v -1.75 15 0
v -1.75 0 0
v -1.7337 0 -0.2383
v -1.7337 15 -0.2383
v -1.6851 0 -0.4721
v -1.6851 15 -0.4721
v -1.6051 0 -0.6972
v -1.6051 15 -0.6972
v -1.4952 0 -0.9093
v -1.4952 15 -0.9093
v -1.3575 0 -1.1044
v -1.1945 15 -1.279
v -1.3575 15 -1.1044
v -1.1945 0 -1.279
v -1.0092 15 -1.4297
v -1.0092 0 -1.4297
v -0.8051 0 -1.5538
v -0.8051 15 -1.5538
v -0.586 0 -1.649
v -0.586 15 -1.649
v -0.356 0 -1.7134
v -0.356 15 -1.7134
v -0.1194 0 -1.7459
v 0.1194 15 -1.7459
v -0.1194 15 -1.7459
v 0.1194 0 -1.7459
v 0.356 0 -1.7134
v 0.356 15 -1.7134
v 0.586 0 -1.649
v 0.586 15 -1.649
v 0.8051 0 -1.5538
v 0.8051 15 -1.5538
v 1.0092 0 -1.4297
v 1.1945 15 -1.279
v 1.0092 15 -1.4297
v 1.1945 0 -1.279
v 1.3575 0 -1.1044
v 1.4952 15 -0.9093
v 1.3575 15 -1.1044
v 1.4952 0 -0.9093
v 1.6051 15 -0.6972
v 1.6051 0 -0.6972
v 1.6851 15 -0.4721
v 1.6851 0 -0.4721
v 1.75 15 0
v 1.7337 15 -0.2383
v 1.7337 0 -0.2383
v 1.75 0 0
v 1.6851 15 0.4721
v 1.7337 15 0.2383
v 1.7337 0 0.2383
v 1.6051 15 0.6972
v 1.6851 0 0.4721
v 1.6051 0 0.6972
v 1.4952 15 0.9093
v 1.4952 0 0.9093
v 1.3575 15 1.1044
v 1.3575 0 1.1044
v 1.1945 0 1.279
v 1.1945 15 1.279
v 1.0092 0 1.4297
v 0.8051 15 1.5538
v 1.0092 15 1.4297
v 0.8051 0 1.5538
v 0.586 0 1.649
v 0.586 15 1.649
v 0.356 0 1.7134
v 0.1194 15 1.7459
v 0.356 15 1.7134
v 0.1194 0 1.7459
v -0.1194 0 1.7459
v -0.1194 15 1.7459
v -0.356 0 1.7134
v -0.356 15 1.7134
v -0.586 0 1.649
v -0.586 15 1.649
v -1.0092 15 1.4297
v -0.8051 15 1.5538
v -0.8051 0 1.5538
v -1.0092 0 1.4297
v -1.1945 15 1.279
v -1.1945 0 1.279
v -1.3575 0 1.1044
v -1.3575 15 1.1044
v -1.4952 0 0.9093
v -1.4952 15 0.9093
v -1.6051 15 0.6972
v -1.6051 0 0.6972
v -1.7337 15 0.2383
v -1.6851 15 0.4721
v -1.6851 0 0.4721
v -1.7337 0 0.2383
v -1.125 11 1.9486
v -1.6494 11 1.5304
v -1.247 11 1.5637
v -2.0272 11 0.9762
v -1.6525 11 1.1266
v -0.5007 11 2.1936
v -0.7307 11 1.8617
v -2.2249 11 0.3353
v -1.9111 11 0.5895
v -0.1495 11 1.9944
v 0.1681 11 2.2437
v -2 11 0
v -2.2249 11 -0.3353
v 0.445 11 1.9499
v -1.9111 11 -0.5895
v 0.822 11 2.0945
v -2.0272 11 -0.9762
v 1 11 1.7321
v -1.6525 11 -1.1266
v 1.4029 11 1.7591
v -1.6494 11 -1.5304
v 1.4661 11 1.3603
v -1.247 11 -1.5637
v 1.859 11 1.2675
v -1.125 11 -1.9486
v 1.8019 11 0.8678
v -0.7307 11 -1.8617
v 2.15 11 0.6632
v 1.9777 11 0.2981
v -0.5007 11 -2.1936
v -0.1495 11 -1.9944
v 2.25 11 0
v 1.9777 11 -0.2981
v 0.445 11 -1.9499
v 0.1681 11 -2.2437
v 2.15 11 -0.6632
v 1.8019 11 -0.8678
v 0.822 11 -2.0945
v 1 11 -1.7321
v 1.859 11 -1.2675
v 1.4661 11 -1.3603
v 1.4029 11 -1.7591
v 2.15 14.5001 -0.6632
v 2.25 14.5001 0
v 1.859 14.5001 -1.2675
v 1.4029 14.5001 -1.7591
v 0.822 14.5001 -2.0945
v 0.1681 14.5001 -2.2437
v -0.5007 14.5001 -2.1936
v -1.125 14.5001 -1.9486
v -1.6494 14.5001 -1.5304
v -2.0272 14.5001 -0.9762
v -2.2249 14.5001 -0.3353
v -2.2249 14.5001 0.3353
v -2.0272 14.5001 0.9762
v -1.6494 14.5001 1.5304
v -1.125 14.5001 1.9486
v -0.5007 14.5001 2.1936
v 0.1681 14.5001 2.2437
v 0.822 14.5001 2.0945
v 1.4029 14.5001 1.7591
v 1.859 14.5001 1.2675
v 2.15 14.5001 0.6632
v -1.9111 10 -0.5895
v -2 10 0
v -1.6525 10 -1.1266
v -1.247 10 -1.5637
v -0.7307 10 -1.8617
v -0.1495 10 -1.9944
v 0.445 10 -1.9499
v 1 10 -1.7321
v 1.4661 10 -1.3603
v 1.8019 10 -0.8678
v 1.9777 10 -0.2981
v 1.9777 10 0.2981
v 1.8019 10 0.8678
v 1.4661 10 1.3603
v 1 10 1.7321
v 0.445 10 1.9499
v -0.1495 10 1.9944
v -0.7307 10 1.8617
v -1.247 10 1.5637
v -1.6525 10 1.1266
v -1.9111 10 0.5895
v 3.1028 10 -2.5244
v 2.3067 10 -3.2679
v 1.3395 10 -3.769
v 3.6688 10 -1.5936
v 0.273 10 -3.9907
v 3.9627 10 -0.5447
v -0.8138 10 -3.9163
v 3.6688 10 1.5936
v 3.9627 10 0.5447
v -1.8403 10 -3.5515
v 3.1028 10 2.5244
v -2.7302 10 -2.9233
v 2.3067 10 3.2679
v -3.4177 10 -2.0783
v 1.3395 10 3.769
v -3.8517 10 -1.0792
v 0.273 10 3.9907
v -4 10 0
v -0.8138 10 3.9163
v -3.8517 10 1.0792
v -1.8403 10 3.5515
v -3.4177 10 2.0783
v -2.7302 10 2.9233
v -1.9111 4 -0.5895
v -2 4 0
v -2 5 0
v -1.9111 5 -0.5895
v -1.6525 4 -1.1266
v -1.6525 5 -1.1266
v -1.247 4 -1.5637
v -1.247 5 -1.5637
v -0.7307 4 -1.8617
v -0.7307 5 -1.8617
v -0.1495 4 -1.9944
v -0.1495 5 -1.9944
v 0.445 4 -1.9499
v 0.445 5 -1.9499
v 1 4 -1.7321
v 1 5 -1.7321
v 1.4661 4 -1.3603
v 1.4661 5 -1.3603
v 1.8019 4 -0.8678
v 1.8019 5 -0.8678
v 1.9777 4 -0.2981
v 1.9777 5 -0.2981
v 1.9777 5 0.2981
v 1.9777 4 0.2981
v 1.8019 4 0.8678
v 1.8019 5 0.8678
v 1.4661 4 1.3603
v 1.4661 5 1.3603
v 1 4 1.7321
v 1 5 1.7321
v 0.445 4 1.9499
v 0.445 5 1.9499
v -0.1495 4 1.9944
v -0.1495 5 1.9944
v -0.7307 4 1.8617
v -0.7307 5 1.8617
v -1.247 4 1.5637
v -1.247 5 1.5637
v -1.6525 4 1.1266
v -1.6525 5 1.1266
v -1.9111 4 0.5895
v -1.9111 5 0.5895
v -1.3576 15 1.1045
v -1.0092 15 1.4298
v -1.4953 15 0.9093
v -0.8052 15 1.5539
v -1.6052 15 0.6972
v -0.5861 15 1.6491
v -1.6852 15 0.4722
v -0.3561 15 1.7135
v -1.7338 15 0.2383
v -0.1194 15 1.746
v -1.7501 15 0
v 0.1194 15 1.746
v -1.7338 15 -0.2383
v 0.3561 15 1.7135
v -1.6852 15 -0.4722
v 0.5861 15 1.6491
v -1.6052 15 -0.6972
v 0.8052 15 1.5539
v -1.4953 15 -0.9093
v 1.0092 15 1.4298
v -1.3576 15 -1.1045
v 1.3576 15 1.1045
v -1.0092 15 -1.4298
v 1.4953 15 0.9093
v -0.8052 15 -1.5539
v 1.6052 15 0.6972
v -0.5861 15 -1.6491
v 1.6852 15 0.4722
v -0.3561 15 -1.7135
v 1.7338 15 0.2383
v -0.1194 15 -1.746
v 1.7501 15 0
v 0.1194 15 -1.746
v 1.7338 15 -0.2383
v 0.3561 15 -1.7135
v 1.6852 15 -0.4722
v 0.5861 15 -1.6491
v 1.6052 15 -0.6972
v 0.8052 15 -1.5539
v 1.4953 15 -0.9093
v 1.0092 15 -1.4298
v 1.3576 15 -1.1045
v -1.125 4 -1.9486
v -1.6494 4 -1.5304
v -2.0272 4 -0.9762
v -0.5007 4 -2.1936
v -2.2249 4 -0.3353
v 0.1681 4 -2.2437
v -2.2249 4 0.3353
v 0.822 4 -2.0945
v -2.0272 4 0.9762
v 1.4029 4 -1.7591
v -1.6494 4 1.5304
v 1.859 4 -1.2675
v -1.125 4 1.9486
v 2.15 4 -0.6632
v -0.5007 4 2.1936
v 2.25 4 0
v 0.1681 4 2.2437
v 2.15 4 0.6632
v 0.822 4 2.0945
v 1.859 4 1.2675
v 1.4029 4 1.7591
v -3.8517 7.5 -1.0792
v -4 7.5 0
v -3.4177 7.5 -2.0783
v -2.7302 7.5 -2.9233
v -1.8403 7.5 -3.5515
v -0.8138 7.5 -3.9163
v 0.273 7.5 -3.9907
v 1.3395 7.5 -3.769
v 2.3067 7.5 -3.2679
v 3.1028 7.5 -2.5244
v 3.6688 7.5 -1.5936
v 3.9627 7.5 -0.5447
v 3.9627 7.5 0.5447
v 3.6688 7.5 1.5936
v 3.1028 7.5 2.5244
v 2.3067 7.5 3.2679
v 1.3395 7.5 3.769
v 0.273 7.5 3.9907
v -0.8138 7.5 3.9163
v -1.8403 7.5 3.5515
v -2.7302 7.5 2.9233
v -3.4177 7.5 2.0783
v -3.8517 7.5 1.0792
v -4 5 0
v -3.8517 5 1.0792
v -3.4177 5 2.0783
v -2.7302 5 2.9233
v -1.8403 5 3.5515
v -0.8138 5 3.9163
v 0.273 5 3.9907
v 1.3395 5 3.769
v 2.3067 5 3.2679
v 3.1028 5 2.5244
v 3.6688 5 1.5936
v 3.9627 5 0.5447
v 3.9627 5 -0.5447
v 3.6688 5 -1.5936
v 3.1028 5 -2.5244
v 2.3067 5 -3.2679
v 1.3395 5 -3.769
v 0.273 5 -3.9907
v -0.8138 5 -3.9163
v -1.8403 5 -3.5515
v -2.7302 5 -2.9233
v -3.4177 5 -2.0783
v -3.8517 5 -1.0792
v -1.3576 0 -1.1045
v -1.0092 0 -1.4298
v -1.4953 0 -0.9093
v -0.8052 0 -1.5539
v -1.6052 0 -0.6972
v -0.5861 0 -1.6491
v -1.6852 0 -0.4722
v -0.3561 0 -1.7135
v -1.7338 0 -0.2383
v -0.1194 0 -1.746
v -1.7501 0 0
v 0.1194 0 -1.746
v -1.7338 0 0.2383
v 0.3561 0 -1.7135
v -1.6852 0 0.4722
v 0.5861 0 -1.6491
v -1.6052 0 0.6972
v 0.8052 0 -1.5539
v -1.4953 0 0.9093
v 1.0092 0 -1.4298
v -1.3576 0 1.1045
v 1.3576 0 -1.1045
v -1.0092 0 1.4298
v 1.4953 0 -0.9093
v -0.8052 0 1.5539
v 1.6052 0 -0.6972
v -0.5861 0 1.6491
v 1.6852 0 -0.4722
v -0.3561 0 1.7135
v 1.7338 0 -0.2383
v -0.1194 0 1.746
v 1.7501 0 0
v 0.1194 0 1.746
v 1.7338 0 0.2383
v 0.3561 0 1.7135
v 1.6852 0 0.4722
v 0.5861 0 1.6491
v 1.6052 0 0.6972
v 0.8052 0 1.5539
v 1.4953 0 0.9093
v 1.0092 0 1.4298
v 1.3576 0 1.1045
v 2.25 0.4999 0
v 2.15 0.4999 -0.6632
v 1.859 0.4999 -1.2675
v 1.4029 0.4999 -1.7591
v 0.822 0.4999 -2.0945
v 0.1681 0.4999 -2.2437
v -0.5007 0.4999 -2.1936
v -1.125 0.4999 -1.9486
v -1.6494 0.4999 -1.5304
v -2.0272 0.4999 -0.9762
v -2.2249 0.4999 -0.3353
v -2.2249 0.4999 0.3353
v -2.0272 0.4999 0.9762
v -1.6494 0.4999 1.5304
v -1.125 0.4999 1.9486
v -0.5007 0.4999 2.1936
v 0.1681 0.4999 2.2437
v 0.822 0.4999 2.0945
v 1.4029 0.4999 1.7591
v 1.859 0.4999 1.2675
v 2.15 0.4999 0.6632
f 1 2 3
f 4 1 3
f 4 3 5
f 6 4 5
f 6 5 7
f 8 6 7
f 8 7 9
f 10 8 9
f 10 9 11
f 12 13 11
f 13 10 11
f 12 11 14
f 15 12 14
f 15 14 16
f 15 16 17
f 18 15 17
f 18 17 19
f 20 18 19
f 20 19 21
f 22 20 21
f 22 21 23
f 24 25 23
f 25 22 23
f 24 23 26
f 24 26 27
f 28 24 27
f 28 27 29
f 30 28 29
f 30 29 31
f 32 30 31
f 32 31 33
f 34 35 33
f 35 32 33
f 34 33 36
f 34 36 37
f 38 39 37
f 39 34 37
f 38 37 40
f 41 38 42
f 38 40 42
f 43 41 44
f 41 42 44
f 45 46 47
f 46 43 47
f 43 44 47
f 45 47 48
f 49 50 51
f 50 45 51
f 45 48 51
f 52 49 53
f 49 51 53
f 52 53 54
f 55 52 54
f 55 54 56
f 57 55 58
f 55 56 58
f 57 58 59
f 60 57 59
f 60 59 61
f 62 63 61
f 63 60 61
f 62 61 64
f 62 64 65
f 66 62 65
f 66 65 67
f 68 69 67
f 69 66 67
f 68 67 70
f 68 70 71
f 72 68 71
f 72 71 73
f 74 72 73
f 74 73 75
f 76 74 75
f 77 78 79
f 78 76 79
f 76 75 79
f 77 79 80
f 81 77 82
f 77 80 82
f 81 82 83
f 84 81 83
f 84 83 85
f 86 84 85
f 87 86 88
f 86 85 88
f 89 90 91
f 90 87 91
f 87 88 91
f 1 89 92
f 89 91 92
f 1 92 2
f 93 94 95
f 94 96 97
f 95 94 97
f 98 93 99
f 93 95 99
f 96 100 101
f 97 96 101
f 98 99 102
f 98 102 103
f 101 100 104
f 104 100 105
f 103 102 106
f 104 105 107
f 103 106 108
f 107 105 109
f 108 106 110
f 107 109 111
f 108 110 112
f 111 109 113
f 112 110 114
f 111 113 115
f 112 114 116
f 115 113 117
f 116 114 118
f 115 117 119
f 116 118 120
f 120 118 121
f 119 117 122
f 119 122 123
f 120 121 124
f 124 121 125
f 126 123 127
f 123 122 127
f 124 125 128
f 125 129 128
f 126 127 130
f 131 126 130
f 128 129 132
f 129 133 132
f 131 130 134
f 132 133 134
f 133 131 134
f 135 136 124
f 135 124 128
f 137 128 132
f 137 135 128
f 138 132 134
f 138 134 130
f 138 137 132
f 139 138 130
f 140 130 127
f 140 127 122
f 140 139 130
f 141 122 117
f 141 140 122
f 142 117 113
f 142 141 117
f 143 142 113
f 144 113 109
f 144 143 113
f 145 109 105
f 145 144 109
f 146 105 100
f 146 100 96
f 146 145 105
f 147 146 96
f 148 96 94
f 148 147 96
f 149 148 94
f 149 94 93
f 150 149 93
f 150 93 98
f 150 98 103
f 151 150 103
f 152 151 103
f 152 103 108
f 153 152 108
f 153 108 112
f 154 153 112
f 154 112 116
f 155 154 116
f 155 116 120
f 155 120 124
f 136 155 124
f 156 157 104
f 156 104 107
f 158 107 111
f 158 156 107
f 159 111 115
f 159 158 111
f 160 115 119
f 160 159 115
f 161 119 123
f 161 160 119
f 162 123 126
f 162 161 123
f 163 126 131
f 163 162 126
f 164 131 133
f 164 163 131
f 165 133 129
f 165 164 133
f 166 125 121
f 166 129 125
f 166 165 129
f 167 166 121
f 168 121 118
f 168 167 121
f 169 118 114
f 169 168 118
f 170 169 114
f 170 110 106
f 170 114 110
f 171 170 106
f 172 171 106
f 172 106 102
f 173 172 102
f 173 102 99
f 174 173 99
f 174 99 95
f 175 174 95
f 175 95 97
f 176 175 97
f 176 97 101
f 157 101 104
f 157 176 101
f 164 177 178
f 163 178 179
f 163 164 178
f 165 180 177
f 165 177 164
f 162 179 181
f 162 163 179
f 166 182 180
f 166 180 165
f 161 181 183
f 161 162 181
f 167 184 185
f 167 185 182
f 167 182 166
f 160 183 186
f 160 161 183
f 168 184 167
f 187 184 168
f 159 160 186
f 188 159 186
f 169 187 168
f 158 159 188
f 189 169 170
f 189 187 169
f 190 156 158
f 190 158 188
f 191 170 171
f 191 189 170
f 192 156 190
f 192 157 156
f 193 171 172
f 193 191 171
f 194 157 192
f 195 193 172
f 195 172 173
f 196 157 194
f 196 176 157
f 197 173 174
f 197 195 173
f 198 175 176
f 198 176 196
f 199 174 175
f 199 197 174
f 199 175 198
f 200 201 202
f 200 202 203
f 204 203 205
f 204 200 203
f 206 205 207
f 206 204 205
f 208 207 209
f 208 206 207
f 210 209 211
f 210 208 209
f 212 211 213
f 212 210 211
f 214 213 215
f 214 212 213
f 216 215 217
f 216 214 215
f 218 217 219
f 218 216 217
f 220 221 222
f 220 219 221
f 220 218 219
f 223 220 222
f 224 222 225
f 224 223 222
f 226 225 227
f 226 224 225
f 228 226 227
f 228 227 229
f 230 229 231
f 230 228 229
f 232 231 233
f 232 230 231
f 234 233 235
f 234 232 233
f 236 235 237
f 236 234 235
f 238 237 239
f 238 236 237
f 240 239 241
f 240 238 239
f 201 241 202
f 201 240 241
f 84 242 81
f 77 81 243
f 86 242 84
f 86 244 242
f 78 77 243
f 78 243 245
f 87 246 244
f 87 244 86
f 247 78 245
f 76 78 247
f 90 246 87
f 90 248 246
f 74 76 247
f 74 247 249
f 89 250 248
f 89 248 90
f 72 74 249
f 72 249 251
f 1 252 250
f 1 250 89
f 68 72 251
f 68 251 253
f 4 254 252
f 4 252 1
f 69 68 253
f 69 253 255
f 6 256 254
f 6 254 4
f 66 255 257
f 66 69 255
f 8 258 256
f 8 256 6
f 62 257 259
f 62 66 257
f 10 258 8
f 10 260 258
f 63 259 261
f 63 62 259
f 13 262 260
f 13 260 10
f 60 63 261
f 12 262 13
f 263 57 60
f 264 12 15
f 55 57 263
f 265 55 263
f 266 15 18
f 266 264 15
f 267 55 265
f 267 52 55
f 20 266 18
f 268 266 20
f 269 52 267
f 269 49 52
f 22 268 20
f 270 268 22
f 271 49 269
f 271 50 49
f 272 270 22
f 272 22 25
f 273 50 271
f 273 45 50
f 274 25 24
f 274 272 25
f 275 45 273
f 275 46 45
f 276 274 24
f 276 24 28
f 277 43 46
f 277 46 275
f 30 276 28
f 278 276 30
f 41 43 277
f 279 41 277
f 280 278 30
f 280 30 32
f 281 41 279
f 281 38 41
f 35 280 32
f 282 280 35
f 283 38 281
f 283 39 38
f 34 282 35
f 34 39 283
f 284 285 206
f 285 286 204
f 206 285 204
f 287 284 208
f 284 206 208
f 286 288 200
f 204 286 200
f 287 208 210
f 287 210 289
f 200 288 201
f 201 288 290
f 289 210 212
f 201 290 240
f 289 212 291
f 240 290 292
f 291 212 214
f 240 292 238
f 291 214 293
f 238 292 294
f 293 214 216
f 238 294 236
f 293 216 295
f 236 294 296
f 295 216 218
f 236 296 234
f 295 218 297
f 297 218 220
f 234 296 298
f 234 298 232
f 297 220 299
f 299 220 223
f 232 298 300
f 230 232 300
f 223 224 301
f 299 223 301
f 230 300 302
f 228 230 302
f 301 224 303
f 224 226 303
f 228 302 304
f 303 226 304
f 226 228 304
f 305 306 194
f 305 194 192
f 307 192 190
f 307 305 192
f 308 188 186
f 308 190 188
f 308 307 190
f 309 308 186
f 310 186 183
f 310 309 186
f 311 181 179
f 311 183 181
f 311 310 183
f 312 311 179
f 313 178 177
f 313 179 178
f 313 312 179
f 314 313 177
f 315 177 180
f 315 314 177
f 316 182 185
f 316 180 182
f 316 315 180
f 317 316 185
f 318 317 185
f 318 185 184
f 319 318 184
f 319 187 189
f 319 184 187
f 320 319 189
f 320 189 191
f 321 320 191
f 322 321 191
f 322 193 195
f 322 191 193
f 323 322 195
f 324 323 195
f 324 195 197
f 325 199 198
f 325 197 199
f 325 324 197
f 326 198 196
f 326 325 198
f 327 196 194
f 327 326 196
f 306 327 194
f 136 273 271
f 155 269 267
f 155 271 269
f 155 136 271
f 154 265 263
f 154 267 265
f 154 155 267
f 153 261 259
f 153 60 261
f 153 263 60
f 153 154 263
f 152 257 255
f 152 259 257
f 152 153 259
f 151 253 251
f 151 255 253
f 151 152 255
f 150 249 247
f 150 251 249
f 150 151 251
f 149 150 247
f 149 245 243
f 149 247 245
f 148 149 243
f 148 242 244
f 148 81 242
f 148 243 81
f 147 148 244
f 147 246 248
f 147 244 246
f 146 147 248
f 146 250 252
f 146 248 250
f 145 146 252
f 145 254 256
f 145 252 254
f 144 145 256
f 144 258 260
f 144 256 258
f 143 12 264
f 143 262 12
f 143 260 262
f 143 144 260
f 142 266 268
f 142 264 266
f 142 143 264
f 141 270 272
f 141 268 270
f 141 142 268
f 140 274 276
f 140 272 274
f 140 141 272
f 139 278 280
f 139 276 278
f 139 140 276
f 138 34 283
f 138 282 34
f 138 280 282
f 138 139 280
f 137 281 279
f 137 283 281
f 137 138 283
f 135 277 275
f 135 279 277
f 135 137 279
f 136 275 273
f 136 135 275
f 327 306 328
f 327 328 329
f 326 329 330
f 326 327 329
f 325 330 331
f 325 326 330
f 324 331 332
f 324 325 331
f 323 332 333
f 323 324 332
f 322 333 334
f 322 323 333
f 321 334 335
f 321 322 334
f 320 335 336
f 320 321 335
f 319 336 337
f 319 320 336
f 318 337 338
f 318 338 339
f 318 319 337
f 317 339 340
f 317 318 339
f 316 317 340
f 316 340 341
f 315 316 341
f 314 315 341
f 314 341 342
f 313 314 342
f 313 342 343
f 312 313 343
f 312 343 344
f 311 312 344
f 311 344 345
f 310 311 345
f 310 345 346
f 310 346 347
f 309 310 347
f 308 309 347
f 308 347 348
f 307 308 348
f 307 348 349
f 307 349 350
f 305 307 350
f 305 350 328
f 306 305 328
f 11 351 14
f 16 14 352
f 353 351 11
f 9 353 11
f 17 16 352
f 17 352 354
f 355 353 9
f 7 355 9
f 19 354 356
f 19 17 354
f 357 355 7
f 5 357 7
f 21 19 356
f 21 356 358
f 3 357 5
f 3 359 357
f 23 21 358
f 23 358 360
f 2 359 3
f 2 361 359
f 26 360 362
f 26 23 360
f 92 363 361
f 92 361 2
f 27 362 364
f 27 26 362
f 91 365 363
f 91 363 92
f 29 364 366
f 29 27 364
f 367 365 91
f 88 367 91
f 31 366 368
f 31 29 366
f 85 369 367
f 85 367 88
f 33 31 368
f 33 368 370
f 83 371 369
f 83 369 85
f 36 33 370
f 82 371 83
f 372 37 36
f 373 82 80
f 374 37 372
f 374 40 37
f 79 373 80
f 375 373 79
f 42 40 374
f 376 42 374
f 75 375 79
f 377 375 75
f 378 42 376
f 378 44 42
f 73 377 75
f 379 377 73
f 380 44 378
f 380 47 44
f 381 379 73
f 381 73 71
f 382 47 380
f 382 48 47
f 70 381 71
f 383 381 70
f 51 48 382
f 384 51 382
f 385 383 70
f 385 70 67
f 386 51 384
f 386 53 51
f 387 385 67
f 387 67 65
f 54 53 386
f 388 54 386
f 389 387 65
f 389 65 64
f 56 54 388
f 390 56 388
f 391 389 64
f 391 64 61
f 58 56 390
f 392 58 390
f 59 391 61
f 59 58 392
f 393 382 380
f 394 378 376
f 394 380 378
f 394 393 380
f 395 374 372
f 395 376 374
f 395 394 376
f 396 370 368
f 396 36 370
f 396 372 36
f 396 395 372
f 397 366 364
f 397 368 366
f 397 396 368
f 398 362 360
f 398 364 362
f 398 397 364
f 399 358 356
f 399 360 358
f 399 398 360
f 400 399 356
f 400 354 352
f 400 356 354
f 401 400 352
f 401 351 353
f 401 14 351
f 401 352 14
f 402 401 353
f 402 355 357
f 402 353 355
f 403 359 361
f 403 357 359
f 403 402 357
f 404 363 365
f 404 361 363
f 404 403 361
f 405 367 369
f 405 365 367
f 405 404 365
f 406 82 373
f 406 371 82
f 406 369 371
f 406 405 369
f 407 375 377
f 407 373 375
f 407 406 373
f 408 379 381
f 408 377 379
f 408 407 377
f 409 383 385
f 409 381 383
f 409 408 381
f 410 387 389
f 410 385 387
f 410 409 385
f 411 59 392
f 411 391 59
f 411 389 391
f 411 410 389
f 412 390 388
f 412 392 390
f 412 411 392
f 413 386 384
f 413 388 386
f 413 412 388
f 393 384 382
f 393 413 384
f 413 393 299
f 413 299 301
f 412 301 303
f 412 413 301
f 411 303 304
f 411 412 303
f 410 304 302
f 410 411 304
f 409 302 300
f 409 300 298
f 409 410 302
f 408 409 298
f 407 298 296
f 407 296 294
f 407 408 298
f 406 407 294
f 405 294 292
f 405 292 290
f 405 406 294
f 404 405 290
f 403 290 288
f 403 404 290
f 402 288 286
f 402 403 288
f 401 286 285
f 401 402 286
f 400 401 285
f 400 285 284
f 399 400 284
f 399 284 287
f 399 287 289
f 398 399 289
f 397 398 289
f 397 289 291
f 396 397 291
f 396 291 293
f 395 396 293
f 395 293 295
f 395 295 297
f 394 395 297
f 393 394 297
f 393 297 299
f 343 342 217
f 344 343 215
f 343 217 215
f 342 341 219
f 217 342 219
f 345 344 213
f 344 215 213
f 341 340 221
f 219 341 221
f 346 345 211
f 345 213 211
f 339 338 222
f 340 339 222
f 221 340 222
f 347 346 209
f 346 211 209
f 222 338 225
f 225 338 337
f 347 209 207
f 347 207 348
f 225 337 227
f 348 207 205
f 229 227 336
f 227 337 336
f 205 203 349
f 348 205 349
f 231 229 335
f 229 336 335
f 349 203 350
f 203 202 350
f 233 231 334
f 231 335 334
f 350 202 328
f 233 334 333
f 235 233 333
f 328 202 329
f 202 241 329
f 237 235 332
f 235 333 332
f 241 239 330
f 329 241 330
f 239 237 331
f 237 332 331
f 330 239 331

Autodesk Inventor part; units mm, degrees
ref_plane "YZ Plane" through (0, 0, 0) normal (1, 0, 0) x (0, 1, 0)
ref_plane "XY Plane" through (0, 0, 0) normal (0, 0, 1) x (1, 0, 0)
sketch "Sketch1" plane through (0, 0, 0) normal (0, 1, 0) x (-1, 0, 0)
  circle A0 centre (0, 0) radius 1.75
  circle A1 centre (0, 0) radius 2
  dimension "d0" = 3.5
  dimension "d1" = 4
extrude "Extrusion1" add sketch "Sketch1" along normal blind 15
sketch "Sketch2" plane through (0, 0, 0) normal (0, -1, 0) x (1, 0, 0)
  circle A0 centre (0, 0) radius 2.25
  circle A1 centre (0, 0) radius 2
  dimension "d4" = 4.5
extrude "Extrusion2" add sketch "Sketch2" against normal blind 4
sketch "Sketch3" plane through (0, 15, 0) normal (0, 1, 0) x (1, 0, 0)
  circle A0 centre (0, 0) radius 2
  circle A1 centre (0, 0) radius 2.25
  circle A2 centre (0, 0) radius 2.25
  dimension "d9" = 4.5
  dimension "d10" = 4.5
  dimension "d11" = 4
  dimension "d12" = 0
extrude "Extrusion3" add sketch "Sketch3" against normal blind 4
ref_plane "Work Plane4" through (0, 7.5, 0) normal (0, 1, 0) x (-1, 0, 0)
ref_plane "Work Plane3" through (0, -4, 0) normal (0, 1, 0) x (-1, 0, 0)
sketch "Sketch4" plane through (0, 7.5, 0) normal (0, 1, 0) x (-1, 0, 0)
  circle A0 centre (0, 0) radius 2
  circle A1 centre (0, 0) radius 4
  dimension "d16" = 4
  dimension "d17" = 8
chamfer "Chamfer3" distance 0.5 angle 45 1 edges at (-2.25, 0, 0)
chamfer "Chamfer4" distance 0.5 angle 45 1 edges at (-2.25, 15, 0)
extrude "Extrusion5" add sketch "Sketch4" along normal mid plane 5
properties part number "reverse gear cylinder piping connector 2"
